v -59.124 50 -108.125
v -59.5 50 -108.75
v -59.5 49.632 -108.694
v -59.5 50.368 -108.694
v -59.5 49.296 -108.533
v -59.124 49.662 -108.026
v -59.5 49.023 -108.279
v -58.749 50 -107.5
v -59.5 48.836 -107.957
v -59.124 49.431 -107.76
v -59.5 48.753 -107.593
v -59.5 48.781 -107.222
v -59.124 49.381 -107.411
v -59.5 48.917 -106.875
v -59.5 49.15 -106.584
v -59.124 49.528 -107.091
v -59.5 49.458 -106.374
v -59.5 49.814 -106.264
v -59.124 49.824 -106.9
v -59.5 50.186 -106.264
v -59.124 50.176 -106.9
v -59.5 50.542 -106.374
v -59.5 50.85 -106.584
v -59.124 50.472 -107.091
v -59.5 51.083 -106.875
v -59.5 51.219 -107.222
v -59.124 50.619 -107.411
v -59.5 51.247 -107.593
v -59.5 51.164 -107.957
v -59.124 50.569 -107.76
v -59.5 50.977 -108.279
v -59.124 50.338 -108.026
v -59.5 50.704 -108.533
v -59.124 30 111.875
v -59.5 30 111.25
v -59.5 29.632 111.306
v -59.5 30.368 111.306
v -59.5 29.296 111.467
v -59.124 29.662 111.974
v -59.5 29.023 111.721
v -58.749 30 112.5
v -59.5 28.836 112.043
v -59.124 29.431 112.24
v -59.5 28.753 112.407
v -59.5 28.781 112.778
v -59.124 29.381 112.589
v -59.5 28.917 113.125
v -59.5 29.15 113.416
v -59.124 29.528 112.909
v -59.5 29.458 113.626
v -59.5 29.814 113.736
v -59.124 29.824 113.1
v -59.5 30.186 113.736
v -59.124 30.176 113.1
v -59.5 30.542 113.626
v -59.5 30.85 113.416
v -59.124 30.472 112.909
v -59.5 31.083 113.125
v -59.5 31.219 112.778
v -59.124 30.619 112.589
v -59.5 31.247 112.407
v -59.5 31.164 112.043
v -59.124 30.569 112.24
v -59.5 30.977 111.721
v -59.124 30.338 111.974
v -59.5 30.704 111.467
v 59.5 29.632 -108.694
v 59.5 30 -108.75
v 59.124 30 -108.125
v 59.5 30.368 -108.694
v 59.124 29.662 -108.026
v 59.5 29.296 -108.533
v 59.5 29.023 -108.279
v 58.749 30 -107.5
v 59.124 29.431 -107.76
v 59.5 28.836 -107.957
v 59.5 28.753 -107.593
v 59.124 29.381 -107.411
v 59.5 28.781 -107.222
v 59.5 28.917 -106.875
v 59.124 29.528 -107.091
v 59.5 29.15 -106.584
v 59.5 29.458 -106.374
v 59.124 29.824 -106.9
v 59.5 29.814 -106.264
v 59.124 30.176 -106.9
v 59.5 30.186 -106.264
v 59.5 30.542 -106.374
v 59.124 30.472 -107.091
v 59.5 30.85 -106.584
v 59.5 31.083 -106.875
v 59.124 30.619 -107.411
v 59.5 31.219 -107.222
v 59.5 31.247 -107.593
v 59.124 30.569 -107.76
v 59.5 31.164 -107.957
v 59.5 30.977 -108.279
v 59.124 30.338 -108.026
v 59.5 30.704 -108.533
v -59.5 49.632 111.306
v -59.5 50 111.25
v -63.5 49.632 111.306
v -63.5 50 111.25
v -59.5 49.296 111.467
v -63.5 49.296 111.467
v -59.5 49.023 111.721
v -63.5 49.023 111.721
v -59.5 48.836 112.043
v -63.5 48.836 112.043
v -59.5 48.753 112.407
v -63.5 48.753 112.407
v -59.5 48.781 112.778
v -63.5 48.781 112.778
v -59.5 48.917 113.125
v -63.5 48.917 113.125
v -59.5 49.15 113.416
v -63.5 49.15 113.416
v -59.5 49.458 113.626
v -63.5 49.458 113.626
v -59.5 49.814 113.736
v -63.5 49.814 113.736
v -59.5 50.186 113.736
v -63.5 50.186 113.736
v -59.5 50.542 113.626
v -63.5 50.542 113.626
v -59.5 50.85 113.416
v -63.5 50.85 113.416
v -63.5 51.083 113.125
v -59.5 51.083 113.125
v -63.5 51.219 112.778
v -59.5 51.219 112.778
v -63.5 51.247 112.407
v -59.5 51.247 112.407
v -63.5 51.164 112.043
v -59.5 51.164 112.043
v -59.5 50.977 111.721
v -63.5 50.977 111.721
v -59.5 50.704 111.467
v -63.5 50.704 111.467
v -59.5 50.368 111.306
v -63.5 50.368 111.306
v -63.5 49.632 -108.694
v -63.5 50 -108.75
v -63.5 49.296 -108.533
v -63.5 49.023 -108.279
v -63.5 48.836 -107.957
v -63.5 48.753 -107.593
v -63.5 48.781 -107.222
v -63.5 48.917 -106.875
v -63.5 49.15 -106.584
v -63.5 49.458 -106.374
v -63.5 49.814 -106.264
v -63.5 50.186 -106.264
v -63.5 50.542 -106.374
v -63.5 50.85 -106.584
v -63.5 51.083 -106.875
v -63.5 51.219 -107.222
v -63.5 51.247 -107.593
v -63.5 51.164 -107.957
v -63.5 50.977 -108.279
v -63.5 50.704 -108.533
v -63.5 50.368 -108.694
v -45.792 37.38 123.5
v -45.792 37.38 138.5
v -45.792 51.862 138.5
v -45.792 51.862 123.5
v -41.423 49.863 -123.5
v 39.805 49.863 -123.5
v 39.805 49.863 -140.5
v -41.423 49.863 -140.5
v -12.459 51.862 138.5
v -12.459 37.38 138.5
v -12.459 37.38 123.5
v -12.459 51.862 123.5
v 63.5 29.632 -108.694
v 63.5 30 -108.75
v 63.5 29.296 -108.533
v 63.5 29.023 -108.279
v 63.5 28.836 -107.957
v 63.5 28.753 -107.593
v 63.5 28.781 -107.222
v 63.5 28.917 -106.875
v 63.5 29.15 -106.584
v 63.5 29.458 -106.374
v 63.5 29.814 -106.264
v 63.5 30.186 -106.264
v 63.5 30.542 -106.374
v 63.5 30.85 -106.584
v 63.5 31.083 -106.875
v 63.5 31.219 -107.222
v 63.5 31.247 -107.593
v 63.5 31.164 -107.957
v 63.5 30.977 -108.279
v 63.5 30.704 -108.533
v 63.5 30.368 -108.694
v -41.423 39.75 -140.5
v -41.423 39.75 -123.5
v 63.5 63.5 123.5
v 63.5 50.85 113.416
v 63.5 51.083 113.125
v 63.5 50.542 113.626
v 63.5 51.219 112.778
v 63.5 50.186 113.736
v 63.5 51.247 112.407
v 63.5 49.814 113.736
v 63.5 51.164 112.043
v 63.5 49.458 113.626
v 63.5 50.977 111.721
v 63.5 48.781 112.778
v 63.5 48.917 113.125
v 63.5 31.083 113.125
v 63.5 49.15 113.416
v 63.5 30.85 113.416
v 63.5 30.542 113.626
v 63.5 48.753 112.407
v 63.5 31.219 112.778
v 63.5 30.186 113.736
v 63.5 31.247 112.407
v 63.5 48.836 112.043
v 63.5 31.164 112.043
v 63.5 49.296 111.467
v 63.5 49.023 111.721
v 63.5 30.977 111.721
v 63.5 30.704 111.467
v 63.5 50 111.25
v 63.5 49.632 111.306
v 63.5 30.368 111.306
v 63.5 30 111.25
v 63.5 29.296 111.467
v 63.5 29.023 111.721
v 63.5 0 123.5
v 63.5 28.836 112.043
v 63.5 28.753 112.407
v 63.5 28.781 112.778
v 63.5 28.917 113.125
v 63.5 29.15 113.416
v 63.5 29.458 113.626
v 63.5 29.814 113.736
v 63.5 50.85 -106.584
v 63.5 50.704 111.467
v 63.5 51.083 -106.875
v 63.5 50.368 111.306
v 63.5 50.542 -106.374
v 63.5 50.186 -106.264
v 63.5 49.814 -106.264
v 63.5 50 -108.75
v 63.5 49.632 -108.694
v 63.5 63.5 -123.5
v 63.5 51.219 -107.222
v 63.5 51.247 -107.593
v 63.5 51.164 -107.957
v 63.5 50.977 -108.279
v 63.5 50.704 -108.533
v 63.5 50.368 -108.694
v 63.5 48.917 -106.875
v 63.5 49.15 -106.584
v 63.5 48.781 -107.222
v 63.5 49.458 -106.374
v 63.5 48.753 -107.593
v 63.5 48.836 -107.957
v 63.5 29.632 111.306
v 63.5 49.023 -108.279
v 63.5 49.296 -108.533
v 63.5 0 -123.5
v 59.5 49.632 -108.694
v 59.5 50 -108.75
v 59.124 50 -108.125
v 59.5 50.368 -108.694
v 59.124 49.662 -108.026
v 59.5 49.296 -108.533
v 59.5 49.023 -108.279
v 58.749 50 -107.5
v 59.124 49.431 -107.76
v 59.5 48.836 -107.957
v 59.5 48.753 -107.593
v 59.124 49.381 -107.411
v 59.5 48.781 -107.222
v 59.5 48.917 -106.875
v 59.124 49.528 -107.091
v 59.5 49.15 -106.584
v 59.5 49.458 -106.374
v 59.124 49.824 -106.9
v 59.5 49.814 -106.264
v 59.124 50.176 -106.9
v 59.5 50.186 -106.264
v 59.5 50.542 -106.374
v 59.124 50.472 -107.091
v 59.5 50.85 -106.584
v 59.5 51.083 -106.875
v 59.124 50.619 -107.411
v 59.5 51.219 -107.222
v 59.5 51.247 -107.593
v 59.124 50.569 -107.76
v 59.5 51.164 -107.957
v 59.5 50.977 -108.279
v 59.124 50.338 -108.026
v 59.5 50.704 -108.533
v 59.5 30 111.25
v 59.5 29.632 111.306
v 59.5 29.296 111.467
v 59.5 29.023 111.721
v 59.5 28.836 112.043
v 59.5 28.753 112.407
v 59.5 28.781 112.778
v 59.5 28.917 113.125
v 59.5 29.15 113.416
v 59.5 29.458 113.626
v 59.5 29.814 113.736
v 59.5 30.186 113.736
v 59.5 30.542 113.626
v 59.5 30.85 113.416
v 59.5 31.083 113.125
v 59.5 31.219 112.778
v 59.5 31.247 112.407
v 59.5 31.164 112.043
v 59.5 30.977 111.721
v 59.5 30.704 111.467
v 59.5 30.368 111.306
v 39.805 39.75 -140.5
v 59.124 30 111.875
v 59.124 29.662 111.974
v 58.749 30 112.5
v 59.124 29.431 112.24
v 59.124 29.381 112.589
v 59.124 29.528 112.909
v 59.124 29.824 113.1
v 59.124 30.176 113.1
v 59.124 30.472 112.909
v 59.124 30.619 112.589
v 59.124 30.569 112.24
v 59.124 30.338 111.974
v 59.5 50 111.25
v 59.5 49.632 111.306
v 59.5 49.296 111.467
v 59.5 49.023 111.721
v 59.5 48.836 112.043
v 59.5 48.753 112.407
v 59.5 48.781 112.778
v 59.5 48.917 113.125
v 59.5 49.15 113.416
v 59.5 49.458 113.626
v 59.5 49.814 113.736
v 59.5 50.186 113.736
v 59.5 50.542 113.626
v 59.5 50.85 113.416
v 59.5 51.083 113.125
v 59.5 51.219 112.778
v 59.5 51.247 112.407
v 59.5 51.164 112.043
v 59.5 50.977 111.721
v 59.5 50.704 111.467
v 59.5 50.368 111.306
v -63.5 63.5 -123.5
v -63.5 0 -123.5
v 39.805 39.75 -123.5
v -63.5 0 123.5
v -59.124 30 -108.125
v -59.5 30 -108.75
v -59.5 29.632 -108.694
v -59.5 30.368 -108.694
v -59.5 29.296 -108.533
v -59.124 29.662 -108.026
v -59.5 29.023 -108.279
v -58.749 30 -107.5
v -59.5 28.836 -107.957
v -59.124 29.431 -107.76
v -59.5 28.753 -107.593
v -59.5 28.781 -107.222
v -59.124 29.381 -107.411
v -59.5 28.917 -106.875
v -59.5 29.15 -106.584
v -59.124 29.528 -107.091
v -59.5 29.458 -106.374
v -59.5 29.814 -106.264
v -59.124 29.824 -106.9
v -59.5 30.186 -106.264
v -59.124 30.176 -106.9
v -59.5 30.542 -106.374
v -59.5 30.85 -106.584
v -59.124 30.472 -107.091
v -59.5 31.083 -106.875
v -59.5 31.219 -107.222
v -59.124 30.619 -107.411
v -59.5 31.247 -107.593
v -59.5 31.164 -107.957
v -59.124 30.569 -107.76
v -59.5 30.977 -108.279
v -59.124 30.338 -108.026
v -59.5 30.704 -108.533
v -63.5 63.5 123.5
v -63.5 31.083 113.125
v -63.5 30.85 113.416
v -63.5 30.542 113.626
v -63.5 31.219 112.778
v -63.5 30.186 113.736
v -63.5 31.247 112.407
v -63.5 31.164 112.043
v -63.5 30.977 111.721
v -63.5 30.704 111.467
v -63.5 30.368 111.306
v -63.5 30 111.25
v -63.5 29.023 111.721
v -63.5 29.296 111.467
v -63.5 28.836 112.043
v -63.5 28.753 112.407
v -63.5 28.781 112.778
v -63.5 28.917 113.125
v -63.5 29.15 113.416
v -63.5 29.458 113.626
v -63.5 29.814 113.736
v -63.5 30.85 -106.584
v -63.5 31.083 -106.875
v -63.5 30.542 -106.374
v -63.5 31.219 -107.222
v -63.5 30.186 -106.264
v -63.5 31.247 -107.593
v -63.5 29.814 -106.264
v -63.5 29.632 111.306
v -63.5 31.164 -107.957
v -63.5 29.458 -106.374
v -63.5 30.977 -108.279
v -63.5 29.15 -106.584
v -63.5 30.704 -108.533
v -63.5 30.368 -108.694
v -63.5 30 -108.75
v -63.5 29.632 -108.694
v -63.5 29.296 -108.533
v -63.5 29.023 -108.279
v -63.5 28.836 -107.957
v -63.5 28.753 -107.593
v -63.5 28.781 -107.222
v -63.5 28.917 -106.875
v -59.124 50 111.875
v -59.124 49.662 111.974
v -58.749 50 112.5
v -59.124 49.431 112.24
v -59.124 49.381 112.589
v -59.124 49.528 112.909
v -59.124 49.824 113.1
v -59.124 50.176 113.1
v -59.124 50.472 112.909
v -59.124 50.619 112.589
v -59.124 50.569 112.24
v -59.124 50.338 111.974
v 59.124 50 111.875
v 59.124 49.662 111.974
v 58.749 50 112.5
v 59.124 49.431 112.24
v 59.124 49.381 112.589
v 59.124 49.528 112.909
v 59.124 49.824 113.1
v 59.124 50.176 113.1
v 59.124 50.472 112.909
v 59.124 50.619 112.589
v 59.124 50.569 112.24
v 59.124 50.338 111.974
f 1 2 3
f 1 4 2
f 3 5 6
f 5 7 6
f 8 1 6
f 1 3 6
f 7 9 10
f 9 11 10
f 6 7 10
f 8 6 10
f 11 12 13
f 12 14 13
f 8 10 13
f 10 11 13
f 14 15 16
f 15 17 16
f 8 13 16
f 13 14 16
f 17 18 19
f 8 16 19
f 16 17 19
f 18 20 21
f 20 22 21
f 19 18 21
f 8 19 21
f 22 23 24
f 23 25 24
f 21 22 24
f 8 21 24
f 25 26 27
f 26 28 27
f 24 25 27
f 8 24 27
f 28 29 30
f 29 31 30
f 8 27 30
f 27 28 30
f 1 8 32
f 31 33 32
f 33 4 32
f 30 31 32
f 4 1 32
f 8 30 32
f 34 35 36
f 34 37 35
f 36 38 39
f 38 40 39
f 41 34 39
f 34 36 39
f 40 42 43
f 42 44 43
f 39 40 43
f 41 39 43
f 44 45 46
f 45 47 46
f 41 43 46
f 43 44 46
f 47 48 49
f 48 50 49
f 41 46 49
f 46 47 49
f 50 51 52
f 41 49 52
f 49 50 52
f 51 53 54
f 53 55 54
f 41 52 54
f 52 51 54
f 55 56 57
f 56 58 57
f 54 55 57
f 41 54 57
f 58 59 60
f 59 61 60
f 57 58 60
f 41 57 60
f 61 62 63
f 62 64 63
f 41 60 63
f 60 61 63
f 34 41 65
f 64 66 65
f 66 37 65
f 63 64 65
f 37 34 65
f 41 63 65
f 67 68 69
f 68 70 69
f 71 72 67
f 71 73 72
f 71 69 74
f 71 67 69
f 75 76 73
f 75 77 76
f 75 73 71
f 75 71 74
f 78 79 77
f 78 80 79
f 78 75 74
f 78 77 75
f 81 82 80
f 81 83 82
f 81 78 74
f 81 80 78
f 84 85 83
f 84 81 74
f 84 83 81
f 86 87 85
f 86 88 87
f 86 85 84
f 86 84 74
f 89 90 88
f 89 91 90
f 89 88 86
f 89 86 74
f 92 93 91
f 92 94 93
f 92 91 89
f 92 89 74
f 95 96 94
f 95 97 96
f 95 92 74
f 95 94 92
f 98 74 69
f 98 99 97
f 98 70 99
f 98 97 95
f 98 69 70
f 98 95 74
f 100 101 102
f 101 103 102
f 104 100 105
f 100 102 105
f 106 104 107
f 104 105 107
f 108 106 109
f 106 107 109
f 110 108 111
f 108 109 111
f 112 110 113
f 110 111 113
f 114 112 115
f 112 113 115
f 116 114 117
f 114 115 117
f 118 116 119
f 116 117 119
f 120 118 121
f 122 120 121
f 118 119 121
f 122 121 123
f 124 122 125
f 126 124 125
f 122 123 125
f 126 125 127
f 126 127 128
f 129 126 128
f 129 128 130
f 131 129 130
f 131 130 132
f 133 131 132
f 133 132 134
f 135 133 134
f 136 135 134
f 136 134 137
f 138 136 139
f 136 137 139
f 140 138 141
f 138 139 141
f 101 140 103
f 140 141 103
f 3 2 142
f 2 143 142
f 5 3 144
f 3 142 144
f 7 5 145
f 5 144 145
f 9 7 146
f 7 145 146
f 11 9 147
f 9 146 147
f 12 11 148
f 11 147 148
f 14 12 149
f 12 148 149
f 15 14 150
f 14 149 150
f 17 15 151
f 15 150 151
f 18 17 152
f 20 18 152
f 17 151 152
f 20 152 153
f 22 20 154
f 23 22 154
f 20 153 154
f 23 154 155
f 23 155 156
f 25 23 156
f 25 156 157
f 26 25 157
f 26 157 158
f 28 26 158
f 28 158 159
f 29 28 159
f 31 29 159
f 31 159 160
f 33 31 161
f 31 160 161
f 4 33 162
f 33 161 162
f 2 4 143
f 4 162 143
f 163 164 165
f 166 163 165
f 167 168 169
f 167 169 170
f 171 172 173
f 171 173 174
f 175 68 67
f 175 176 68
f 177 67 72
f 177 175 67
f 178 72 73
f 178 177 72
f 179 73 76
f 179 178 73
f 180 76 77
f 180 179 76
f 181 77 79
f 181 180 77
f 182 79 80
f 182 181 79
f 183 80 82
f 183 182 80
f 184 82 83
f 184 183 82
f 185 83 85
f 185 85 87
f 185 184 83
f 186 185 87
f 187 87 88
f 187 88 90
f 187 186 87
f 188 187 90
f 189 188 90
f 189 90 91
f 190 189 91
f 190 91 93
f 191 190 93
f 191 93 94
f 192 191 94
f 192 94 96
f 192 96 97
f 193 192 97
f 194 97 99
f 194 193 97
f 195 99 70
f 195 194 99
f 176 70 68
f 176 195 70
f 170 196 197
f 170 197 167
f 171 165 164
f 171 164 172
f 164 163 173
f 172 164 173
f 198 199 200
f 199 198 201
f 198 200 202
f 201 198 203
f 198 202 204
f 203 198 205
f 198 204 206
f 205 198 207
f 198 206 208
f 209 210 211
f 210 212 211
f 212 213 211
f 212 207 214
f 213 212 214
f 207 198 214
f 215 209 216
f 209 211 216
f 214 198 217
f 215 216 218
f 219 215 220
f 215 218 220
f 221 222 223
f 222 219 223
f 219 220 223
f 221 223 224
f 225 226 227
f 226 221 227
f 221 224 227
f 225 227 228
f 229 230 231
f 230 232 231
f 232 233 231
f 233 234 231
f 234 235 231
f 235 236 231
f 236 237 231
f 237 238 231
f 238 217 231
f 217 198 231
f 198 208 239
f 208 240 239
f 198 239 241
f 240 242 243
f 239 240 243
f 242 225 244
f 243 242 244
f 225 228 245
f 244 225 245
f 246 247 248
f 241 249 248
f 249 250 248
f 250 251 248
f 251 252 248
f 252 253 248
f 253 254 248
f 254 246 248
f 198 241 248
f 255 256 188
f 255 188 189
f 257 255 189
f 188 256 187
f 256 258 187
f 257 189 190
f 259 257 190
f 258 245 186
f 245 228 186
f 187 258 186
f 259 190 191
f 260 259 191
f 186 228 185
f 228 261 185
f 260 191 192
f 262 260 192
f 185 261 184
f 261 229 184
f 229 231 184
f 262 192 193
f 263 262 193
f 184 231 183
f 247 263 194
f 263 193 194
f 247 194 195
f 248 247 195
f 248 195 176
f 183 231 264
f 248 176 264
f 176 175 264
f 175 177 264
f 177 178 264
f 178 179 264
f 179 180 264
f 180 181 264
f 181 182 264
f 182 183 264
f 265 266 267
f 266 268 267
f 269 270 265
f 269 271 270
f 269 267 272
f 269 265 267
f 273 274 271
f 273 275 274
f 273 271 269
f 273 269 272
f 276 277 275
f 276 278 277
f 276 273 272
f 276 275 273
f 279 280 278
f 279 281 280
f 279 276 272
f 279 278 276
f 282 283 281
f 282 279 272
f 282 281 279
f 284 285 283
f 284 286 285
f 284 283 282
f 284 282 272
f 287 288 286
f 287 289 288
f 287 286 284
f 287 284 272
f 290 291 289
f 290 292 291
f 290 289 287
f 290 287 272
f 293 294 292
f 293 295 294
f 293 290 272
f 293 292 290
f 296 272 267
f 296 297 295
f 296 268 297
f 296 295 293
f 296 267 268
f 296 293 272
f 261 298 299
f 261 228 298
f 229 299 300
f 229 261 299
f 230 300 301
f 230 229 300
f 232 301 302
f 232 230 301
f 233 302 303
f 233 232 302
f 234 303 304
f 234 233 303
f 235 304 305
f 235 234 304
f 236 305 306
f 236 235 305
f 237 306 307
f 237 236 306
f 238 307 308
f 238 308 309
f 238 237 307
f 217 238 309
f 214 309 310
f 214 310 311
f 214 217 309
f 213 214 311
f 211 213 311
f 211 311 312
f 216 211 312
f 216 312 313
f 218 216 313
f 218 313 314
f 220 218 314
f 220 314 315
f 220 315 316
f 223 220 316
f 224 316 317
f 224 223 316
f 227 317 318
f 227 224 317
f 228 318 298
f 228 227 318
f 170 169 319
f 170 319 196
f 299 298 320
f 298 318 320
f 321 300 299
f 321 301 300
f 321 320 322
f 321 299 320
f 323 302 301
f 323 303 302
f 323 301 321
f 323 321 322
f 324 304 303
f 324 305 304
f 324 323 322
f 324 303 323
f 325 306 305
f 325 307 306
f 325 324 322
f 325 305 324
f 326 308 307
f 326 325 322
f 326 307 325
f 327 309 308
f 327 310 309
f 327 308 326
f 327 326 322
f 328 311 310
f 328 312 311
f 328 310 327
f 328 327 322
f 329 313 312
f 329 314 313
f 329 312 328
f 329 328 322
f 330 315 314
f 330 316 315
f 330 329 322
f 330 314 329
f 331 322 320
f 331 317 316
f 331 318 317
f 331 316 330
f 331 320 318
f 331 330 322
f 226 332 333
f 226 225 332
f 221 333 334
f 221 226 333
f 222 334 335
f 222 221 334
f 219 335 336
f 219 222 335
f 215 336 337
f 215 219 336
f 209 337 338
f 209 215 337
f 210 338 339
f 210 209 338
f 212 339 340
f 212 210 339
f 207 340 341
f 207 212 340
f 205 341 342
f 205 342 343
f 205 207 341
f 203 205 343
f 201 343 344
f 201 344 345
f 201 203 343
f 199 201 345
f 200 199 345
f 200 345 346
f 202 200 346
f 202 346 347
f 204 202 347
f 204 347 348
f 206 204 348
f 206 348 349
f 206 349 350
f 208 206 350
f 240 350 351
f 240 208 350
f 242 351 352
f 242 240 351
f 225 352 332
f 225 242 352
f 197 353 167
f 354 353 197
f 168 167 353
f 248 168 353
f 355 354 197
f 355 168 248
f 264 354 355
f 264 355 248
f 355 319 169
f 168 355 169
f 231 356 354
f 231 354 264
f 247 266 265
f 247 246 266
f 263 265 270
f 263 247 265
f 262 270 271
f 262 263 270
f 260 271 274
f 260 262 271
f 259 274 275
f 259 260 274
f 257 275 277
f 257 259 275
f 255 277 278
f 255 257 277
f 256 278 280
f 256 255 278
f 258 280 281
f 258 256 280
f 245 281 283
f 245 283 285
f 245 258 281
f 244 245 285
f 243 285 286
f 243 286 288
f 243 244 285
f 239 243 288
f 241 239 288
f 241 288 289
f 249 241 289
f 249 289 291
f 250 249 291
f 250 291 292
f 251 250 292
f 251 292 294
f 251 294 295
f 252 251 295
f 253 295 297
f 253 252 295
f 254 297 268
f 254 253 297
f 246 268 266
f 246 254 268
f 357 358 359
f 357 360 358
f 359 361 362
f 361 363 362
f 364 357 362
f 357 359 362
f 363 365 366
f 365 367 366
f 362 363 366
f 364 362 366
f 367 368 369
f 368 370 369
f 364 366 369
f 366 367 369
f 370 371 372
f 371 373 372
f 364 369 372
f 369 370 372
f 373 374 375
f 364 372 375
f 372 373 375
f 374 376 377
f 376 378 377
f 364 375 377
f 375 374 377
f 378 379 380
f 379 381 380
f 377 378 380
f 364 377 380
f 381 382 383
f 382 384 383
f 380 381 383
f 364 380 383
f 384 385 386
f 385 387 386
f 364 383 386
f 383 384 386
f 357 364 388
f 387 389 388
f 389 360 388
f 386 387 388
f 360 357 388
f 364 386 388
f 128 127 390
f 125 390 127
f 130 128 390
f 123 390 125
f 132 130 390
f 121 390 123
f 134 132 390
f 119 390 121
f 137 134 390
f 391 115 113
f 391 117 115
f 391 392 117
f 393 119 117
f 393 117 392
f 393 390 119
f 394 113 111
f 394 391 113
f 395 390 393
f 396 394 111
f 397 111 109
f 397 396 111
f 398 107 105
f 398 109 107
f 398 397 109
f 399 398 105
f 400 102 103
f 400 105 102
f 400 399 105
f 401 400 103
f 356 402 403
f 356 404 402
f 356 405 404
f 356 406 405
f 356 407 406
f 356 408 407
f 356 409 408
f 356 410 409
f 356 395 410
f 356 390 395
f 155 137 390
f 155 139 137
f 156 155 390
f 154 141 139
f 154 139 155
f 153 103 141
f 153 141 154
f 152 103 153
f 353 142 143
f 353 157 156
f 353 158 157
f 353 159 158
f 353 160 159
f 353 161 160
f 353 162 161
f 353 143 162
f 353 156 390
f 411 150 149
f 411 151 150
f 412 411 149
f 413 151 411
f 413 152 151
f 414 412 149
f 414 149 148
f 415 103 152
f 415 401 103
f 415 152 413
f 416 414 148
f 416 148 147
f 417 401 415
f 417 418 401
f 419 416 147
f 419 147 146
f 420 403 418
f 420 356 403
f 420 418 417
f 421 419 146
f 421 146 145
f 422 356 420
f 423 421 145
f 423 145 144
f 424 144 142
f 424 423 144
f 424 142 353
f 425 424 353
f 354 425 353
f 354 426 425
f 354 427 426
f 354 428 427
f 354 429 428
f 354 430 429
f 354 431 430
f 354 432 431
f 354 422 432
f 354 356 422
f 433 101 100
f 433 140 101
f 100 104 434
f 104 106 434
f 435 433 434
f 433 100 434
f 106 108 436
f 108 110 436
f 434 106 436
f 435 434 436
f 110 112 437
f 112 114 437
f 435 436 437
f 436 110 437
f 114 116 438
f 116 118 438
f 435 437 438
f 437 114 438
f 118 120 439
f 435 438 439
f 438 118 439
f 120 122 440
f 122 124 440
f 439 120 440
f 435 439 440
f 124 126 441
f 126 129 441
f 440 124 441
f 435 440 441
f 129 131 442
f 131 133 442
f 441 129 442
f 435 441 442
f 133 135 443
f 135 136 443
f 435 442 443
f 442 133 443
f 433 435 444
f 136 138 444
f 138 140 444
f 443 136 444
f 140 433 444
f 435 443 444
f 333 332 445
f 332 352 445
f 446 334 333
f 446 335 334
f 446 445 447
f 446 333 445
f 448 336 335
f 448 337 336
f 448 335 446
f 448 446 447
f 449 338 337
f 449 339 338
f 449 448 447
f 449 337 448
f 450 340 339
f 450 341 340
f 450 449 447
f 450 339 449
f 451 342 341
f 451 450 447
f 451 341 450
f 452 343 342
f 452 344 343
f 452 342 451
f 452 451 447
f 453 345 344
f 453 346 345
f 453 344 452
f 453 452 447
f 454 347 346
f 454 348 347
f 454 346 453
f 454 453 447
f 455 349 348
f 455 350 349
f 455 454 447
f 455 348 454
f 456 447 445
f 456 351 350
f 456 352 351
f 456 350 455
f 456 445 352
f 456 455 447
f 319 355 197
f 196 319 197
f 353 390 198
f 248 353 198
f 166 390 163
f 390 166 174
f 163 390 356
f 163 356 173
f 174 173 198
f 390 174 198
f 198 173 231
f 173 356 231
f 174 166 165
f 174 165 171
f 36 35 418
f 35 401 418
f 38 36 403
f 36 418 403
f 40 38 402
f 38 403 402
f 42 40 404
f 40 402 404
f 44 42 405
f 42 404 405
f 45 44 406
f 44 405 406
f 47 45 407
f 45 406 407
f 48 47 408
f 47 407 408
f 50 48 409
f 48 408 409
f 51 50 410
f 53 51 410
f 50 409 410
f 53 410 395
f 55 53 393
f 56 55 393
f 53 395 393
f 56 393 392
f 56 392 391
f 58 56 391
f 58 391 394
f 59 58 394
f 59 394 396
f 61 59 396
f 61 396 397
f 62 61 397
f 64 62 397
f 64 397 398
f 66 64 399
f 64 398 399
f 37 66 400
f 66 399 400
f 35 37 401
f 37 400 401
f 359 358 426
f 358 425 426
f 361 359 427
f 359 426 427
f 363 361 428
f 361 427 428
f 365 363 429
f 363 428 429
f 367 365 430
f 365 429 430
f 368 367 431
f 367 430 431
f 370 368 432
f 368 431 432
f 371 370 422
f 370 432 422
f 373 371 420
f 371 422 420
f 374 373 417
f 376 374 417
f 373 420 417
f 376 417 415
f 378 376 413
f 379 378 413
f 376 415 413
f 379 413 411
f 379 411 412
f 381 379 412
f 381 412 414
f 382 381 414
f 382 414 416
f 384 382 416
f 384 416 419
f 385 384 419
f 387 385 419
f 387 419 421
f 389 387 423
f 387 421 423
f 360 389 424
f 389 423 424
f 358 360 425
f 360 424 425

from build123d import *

# Parameters (mm, degrees)
SKETCH1_W                      = 127
SKETCH1_H                      = 247
BOSS_EXTRUDE1_DEPTH            = 63.5
M3X0_5_TAPPED_HOLE1_AT_2_COUNT = 2
M3X0_5_TAPPED_HOLE1_AT_2_PITCH = 220.907220344
M3X0_5_TAPPED_HOLE1_AT_3_COUNT = 2
M3X0_5_TAPPED_HOLE1_AT_3_PITCH = 20
M3X0_5_TAPPED_HOLE1_AT_4_COUNT = 2
M3X0_5_TAPPED_HOLE1_AT_4_PITCH = 220
SKETCH5_W                      = 33.332781188
SKETCH5_H                      = 14.481960758
BOSS_EXTRUDE2_DEPTH            = 15
SKETCH6_W                      = 81.228427944
SKETCH6_H                      = 10.113101088
BOSS_EXTRUDE3_DEPTH            = 17


with BuildPart() as part:
    # Sketch1 → Boss-Extrude1 (new body)
    with BuildSketch(Plane(origin=(0, 0, 0), x_dir=(1, 0, 0), z_dir=(0, 1, 0))):
        Rectangle(SKETCH1_W, SKETCH1_H)
    extrude(amount=BOSS_EXTRUDE1_DEPTH)

    # Sketch4 → M3x0.5 Tapped Hole1 (revolve, cut)
    with BuildSketch(Plane(origin=(63.5, 50, 112.5), x_dir=(0, 0, -1), z_dir=(0, 1, 0))):
        Polygon((0, 0), (0, 4.751075774), (1.25, 4), (1.25, 0), align=None)
    m3x0_5_tapped_hole1 = revolve(axis=Axis((69.85, 50, 112.5), (-1, 0, 0)), mode=Mode.SUBTRACT)

    # M3x0.5 Tapped Hole1 at 2: M3x0.5 Tapped Hole1 ×2
    with Locations(*[Vector(0, -0.09053574604251853, -0.9958932064677039) * (i * M3X0_5_TAPPED_HOLE1_AT_2_PITCH) for i in range(1, M3X0_5_TAPPED_HOLE1_AT_2_COUNT)]):
        add(m3x0_5_tapped_hole1, mode=Mode.SUBTRACT)

    # M3x0.5 Tapped Hole1 at 3: M3x0.5 Tapped Hole1 ×2
    with Locations(*[(0, -i * M3X0_5_TAPPED_HOLE1_AT_3_PITCH, 0) for i in range(1, M3X0_5_TAPPED_HOLE1_AT_3_COUNT)]):
        add(m3x0_5_tapped_hole1, mode=Mode.SUBTRACT)

    # M3x0.5 Tapped Hole1 at 4: M3x0.5 Tapped Hole1 ×2
    with Locations(*[(0, 0, -i * M3X0_5_TAPPED_HOLE1_AT_4_PITCH) for i in range(1, M3X0_5_TAPPED_HOLE1_AT_4_COUNT)]):
        add(m3x0_5_tapped_hole1, mode=Mode.SUBTRACT)

    # Sketch5 → Boss-Extrude2 (add)
    with BuildSketch(Plane.XY.offset(123.5)):
        with Locations((-29.125731135, 44.621088627)):
            Rectangle(SKETCH5_W, SKETCH5_H)
    extrude(amount=BOSS_EXTRUDE2_DEPTH)

    # Sketch6 → Boss-Extrude3 (add)
    with BuildSketch(Plane(origin=(0, 0, -123.5), x_dir=(-1, 0, 0), z_dir=(0, 0, -1))):
        with Locations((0.809048087, 44.806195806)):
            Rectangle(SKETCH6_W, SKETCH6_H)
    extrude(amount=BOSS_EXTRUDE3_DEPTH)

    # Mirror1: M3x0.5 Tapped Hole1 across plane
    add(m3x0_5_tapped_hole1.mirror(Plane(origin=(0, 0, 0), x_dir=(0, 0, 1), z_dir=(1, 0, 0))), mode=Mode.SUBTRACT)

    # Mirror1 copy 1 sketch → Mirror1 copy 1 (revolve, cut)
    with BuildSketch(Plane(origin=(-63.5, 30, -107.5), x_dir=(0, 0, -1), z_dir=(0, 1, 0))):
        Polygon((0, 0), (0, -4.751075774), (1.25, -4), (1.25, 0), align=None)
    revolve(axis=Axis((-69.85, 30, -107.5), (-1, 0, 0)), mode=Mode.SUBTRACT)

    # Mirror1 copy 2 sketch → Mirror1 copy 2 (revolve, cut)
    with BuildSketch(Plane(origin=(-63.5, 30, 112.5), x_dir=(0, 0, -1), z_dir=(0, 1, 0))):
        Polygon((0, 0), (0, -4.751075774), (1.25, -4), (1.25, 0), align=None)
    revolve(axis=Axis((-69.85, 30, 112.5), (-1, 0, 0)), mode=Mode.SUBTRACT)

    # Mirror1 copy 3 sketch → Mirror1 copy 3 (revolve, cut)
    with BuildSketch(Plane(origin=(-63.5, 50, -107.5), x_dir=(0, 0, -1), z_dir=(0, 1, 0))):
        Polygon((0, 0), (0, -4.751075774), (1.25, -4), (1.25, 0), align=None)
    revolve(axis=Axis((-69.85, 50, -107.5), (-1, 0, 0)), mode=Mode.SUBTRACT)


solid = part.part
